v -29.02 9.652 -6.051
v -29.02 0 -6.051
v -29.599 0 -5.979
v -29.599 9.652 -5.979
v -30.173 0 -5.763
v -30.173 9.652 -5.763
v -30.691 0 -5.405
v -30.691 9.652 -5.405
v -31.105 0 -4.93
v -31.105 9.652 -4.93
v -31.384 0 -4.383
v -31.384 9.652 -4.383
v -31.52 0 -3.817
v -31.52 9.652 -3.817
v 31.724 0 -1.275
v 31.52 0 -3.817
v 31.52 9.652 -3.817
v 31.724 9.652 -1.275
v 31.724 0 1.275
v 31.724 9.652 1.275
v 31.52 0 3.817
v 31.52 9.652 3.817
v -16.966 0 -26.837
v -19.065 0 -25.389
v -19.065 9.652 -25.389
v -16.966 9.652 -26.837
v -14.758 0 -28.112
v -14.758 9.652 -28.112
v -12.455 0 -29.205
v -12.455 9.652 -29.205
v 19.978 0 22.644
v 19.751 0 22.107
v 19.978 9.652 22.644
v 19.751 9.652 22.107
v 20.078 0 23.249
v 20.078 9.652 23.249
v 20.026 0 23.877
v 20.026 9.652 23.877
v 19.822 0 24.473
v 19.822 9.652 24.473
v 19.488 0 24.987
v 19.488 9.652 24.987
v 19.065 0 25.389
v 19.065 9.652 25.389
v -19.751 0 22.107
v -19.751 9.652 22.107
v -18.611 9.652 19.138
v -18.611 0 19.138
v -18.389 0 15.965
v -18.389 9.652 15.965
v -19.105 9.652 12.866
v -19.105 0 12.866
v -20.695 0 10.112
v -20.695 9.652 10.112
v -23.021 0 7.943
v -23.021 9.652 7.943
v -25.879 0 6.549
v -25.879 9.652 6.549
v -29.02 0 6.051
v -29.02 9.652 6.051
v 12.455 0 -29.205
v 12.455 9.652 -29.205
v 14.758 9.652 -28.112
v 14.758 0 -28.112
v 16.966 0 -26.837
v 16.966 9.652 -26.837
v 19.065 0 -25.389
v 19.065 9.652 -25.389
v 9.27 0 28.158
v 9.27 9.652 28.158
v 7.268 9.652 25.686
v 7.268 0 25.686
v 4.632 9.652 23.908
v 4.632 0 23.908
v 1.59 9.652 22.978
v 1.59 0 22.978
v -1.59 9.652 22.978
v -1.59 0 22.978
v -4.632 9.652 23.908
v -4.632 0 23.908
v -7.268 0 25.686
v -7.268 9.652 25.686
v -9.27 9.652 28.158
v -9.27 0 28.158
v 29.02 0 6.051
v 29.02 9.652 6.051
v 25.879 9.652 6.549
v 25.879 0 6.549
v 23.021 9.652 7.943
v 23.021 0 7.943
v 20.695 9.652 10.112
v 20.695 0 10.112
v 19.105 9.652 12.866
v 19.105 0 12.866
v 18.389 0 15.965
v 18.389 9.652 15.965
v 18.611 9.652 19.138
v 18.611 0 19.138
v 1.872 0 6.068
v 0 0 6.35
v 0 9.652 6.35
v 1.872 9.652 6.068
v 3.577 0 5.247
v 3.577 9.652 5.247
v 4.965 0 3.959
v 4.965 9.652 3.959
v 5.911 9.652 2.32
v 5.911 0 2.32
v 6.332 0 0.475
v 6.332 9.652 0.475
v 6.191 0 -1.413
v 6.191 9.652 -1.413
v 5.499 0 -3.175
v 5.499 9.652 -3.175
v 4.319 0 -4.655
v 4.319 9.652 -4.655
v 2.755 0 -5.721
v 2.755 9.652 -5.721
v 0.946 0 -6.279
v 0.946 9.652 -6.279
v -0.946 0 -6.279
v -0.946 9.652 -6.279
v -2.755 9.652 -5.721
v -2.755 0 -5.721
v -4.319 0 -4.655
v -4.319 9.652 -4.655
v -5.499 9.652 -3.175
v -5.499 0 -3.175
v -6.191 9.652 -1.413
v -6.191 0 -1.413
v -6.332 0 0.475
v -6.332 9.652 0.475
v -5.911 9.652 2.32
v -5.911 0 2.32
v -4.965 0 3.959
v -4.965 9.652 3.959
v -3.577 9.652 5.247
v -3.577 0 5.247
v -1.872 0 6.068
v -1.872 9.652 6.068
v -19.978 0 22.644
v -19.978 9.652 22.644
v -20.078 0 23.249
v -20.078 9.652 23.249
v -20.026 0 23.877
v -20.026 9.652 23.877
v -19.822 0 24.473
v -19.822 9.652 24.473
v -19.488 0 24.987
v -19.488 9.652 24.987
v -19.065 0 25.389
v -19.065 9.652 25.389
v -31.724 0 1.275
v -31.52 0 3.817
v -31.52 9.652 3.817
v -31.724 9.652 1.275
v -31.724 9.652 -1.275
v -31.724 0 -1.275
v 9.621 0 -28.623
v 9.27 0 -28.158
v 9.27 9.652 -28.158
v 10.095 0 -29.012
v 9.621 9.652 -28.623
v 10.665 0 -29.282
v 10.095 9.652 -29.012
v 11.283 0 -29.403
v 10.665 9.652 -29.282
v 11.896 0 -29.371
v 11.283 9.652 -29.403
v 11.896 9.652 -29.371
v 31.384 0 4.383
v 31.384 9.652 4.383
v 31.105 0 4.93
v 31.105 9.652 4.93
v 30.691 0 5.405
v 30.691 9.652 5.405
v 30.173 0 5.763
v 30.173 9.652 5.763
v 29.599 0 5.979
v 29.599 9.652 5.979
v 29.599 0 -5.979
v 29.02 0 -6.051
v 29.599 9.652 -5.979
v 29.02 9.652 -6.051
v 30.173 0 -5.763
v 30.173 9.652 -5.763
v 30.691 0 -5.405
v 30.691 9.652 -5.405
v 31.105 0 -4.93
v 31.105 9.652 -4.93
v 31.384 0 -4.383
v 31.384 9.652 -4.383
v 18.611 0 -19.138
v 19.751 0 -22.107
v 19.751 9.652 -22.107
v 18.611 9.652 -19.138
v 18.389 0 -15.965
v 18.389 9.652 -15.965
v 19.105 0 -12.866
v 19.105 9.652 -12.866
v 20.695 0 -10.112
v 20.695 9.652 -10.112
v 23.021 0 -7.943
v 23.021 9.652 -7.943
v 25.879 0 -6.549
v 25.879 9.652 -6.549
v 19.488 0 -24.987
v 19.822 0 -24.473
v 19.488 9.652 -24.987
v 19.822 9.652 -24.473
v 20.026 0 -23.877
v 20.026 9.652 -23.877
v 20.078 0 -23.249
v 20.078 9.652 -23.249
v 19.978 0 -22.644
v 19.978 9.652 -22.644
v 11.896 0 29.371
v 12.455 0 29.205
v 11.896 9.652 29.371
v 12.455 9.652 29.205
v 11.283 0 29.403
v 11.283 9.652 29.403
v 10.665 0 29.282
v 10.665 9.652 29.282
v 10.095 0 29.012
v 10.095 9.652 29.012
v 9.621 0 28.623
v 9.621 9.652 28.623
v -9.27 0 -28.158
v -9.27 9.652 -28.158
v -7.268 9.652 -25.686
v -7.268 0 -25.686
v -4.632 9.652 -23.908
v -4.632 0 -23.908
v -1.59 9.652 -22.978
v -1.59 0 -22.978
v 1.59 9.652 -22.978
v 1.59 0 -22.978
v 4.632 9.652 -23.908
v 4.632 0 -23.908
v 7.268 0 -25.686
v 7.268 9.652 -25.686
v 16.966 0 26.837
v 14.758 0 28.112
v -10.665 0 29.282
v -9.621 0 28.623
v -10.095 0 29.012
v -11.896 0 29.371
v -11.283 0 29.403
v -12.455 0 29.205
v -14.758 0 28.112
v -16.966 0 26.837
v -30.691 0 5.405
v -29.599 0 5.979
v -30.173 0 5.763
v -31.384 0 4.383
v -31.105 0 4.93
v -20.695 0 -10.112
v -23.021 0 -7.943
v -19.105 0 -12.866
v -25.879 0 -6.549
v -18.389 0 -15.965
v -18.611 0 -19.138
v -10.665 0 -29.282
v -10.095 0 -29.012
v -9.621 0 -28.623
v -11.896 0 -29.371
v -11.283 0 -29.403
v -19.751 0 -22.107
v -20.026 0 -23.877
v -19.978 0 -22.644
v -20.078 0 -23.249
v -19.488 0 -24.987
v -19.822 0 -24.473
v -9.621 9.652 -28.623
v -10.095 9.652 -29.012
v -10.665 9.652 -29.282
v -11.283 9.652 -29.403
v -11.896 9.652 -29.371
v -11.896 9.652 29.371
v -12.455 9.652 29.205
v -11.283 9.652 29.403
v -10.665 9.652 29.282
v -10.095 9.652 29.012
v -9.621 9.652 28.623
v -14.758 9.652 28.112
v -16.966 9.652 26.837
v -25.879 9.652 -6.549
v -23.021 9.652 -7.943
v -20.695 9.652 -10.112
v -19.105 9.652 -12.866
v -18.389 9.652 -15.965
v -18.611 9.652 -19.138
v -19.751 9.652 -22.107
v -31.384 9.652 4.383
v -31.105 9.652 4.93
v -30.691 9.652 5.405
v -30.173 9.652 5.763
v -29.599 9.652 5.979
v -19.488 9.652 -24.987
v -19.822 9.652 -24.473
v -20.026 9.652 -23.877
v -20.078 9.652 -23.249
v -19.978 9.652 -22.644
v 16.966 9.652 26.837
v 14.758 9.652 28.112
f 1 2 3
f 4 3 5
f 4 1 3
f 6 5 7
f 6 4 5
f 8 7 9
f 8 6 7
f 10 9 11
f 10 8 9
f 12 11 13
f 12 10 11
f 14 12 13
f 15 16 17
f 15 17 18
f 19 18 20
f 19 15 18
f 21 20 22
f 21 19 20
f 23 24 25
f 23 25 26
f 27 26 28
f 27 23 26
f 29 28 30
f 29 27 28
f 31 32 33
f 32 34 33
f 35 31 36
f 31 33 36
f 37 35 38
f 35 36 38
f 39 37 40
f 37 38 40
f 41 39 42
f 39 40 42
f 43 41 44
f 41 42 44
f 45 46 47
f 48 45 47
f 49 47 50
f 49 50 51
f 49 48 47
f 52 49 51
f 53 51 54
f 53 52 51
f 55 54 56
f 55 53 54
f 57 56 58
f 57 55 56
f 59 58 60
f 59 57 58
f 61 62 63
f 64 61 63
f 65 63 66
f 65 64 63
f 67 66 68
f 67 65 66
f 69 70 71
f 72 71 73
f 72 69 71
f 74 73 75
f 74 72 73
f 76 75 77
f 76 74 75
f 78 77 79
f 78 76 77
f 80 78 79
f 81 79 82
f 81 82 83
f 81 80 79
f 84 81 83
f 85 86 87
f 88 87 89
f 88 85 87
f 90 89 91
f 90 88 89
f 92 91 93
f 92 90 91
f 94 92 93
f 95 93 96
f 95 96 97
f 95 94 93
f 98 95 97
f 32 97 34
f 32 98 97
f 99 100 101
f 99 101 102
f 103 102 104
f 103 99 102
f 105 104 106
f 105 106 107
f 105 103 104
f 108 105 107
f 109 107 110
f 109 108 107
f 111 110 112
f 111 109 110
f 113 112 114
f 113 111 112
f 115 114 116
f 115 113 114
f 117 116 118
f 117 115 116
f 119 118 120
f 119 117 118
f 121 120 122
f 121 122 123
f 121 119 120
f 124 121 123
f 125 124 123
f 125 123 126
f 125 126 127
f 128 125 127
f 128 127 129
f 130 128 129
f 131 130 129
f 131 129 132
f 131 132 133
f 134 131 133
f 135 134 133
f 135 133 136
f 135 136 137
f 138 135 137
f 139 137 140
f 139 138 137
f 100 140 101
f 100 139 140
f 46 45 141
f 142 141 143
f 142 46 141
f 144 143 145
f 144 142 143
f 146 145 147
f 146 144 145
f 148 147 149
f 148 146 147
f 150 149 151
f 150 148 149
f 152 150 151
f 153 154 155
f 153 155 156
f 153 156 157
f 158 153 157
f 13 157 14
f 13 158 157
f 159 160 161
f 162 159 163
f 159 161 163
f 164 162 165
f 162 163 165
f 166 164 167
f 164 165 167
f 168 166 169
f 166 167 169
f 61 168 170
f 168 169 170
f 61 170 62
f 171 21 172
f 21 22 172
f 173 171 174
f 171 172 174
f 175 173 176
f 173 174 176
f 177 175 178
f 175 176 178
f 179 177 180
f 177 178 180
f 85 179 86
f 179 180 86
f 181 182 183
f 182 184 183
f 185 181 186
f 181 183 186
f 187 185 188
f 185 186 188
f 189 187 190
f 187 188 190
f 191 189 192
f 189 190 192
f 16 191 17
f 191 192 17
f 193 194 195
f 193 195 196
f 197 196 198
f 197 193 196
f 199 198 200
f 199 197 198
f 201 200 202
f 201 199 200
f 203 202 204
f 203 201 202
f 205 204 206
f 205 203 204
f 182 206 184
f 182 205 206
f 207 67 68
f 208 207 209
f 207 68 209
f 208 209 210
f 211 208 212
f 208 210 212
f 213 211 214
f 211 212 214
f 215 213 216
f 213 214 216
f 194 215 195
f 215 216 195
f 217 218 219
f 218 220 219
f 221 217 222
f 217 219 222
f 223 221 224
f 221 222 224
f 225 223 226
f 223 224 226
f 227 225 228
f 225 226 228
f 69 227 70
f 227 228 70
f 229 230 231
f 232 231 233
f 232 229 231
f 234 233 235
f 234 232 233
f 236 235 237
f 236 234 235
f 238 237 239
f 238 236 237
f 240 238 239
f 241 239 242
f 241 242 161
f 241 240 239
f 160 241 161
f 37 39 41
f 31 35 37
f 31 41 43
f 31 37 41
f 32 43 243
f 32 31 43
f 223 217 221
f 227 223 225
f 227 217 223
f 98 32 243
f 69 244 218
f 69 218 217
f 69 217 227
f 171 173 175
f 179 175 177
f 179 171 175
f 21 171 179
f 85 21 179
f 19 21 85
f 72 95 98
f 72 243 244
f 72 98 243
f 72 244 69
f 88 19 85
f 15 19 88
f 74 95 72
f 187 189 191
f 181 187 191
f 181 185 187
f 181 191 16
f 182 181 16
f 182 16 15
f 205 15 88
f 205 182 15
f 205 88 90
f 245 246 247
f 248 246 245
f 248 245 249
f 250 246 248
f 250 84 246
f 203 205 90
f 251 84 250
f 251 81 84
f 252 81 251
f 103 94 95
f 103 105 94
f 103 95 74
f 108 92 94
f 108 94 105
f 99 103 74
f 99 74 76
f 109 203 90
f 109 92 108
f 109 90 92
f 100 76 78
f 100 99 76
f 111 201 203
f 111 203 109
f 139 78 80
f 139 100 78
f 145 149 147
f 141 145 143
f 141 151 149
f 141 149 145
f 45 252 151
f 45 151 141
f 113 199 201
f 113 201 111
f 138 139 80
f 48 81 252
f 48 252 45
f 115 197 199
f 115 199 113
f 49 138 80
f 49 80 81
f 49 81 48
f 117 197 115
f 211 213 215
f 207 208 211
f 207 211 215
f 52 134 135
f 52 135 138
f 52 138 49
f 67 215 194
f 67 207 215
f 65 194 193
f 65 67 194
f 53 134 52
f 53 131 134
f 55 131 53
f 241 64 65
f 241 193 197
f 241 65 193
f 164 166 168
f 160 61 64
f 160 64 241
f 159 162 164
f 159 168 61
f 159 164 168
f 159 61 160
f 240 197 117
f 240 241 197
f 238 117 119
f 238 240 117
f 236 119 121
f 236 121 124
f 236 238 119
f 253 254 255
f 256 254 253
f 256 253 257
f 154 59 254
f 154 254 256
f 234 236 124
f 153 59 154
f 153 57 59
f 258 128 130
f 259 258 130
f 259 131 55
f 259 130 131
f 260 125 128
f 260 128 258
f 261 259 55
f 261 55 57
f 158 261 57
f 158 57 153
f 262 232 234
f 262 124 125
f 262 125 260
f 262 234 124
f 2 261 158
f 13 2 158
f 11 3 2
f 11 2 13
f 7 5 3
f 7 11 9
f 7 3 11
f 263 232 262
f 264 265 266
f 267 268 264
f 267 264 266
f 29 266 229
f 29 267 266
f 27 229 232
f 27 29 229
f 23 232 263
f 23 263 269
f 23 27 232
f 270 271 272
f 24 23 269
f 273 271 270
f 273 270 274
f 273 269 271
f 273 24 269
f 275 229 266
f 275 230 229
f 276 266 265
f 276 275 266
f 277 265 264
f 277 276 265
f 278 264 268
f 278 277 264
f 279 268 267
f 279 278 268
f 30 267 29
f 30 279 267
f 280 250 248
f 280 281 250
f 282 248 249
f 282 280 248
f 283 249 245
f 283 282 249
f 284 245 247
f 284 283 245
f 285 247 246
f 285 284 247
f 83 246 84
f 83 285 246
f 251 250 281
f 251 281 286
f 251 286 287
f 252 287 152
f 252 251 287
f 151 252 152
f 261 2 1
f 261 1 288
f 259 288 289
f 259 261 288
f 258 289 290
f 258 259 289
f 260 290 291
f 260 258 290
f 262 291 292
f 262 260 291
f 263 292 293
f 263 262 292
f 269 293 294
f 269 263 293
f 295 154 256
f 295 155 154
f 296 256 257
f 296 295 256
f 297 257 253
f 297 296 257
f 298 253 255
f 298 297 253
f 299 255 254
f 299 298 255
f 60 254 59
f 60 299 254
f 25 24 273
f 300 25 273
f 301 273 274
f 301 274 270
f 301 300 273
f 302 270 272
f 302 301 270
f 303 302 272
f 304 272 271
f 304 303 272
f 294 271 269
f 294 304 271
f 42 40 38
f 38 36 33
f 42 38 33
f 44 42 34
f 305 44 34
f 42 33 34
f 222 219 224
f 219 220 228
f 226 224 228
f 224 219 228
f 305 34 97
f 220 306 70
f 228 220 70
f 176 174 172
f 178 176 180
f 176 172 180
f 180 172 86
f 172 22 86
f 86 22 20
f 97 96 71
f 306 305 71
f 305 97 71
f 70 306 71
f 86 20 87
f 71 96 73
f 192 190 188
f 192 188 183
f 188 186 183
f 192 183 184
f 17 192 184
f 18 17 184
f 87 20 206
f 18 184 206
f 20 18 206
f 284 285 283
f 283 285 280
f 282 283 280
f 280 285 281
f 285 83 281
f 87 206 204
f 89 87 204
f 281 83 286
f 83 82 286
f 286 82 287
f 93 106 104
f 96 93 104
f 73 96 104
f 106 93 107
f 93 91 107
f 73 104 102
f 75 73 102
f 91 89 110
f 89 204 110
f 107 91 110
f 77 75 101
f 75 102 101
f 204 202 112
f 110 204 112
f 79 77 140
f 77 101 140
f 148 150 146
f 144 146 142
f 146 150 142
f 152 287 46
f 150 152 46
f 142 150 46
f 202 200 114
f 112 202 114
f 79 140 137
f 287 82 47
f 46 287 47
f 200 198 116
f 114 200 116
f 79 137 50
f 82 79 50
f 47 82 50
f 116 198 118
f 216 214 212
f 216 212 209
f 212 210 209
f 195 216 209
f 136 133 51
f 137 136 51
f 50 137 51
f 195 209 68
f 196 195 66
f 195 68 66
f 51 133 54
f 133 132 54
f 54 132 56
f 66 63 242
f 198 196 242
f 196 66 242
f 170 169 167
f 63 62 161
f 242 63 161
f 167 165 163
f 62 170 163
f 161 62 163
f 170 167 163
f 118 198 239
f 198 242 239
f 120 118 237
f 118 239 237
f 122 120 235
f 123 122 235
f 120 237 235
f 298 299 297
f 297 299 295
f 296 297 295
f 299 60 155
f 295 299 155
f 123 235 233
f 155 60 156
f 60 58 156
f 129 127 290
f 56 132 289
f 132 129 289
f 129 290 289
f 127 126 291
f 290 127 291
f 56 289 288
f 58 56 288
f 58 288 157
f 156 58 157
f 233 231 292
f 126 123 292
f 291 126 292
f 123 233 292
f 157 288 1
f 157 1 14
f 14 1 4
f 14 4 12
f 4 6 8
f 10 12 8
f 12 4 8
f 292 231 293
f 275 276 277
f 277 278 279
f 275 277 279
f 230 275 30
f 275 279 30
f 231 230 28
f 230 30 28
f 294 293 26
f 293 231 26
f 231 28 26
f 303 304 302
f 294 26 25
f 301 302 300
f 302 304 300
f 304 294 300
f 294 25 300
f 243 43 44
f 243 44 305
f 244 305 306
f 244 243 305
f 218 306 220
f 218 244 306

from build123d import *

# Parameters (mm, degrees)
SKETCH1_R           = 6.35
BOSS_EXTRUDE1_DEPTH = 9.652
FILLET1_R           = 2.54


with BuildPart() as part:
    # Sketch1 → Boss-Extrude1 (new body)
    with BuildSketch(Plane(origin=(0, 0, 0), x_dir=(1, 0, 0), z_dir=(0, 1, 0))):
        with BuildLine():
            ThreePointArc((-10.16, 30.080506977), (0, 22.86), (10.16, 30.080506977))
            ThreePointArc((10.16, 30.080506977), (15.875, 27.49630657), (20.970483201, 23.839071591))
            ThreePointArc((20.970483201, 23.839071591), (19.797340731, 11.43), (31.130483201, 6.241435386))
            ThreePointArc((31.130483201, 6.241435386), (31.75, 0), (31.130483201, -6.241435386))
            ThreePointArc((31.130483201, -6.241435386), (19.797340731, -11.43), (20.970483201, -23.839071591))
            ThreePointArc((20.970483201, -23.839071591), (15.875, -27.49630657), (10.16, -30.080506977))
            ThreePointArc((10.16, -30.080506977), (0, -22.86), (-10.16, -30.080506977))
            ThreePointArc((-10.16, -30.080506977), (-15.875, -27.49630657), (-20.970483201, -23.839071591))
            ThreePointArc((-20.970483201, -23.839071591), (-19.797340731, -11.43), (-31.130483201, -6.241435386))
            ThreePointArc((-31.130483201, -6.241435386), (-31.75, 0), (-31.130483201, 6.241435386))
            ThreePointArc((-31.130483201, 6.241435386), (-19.797340731, 11.43), (-20.970483201, 23.839071591))
            ThreePointArc((-20.970483201, 23.839071591), (-15.875, 27.49630657), (-10.16, 30.080506977))
        make_face()
        with Locations(Location((0, 0, 0), (0, 0, 270))):
            Circle(SKETCH1_R, mode=Mode.SUBTRACT)
    extrude(amount=BOSS_EXTRUDE1_DEPTH)

    # Fillet1
    fillet1_edges = [part.edges().sort_by_distance(p)[0] for p in [
        (-10.16, 4.826, -30.080506977),
        (10.16, 4.826, -30.080506977),
        (20.970483201, 4.826, -23.839071591),
        (31.130483201, 4.826, -6.241435386),
        (31.130483201, 4.826, 6.241435386),
        (20.970483201, 4.826, 23.839071591),
        (10.16, 4.826, 30.080506977),
        (-10.16, 4.826, 30.080506977),
        (-20.970483201, 4.826, 23.839071591),
        (-31.130483201, 4.826, 6.241435386),
        (-31.130483201, 4.826, -6.241435386),
        (-20.970483201, 4.826, -23.839071591),
    ]]
    fillet(fillet1_edges, radius=FILLET1_R)


solid = part.part
